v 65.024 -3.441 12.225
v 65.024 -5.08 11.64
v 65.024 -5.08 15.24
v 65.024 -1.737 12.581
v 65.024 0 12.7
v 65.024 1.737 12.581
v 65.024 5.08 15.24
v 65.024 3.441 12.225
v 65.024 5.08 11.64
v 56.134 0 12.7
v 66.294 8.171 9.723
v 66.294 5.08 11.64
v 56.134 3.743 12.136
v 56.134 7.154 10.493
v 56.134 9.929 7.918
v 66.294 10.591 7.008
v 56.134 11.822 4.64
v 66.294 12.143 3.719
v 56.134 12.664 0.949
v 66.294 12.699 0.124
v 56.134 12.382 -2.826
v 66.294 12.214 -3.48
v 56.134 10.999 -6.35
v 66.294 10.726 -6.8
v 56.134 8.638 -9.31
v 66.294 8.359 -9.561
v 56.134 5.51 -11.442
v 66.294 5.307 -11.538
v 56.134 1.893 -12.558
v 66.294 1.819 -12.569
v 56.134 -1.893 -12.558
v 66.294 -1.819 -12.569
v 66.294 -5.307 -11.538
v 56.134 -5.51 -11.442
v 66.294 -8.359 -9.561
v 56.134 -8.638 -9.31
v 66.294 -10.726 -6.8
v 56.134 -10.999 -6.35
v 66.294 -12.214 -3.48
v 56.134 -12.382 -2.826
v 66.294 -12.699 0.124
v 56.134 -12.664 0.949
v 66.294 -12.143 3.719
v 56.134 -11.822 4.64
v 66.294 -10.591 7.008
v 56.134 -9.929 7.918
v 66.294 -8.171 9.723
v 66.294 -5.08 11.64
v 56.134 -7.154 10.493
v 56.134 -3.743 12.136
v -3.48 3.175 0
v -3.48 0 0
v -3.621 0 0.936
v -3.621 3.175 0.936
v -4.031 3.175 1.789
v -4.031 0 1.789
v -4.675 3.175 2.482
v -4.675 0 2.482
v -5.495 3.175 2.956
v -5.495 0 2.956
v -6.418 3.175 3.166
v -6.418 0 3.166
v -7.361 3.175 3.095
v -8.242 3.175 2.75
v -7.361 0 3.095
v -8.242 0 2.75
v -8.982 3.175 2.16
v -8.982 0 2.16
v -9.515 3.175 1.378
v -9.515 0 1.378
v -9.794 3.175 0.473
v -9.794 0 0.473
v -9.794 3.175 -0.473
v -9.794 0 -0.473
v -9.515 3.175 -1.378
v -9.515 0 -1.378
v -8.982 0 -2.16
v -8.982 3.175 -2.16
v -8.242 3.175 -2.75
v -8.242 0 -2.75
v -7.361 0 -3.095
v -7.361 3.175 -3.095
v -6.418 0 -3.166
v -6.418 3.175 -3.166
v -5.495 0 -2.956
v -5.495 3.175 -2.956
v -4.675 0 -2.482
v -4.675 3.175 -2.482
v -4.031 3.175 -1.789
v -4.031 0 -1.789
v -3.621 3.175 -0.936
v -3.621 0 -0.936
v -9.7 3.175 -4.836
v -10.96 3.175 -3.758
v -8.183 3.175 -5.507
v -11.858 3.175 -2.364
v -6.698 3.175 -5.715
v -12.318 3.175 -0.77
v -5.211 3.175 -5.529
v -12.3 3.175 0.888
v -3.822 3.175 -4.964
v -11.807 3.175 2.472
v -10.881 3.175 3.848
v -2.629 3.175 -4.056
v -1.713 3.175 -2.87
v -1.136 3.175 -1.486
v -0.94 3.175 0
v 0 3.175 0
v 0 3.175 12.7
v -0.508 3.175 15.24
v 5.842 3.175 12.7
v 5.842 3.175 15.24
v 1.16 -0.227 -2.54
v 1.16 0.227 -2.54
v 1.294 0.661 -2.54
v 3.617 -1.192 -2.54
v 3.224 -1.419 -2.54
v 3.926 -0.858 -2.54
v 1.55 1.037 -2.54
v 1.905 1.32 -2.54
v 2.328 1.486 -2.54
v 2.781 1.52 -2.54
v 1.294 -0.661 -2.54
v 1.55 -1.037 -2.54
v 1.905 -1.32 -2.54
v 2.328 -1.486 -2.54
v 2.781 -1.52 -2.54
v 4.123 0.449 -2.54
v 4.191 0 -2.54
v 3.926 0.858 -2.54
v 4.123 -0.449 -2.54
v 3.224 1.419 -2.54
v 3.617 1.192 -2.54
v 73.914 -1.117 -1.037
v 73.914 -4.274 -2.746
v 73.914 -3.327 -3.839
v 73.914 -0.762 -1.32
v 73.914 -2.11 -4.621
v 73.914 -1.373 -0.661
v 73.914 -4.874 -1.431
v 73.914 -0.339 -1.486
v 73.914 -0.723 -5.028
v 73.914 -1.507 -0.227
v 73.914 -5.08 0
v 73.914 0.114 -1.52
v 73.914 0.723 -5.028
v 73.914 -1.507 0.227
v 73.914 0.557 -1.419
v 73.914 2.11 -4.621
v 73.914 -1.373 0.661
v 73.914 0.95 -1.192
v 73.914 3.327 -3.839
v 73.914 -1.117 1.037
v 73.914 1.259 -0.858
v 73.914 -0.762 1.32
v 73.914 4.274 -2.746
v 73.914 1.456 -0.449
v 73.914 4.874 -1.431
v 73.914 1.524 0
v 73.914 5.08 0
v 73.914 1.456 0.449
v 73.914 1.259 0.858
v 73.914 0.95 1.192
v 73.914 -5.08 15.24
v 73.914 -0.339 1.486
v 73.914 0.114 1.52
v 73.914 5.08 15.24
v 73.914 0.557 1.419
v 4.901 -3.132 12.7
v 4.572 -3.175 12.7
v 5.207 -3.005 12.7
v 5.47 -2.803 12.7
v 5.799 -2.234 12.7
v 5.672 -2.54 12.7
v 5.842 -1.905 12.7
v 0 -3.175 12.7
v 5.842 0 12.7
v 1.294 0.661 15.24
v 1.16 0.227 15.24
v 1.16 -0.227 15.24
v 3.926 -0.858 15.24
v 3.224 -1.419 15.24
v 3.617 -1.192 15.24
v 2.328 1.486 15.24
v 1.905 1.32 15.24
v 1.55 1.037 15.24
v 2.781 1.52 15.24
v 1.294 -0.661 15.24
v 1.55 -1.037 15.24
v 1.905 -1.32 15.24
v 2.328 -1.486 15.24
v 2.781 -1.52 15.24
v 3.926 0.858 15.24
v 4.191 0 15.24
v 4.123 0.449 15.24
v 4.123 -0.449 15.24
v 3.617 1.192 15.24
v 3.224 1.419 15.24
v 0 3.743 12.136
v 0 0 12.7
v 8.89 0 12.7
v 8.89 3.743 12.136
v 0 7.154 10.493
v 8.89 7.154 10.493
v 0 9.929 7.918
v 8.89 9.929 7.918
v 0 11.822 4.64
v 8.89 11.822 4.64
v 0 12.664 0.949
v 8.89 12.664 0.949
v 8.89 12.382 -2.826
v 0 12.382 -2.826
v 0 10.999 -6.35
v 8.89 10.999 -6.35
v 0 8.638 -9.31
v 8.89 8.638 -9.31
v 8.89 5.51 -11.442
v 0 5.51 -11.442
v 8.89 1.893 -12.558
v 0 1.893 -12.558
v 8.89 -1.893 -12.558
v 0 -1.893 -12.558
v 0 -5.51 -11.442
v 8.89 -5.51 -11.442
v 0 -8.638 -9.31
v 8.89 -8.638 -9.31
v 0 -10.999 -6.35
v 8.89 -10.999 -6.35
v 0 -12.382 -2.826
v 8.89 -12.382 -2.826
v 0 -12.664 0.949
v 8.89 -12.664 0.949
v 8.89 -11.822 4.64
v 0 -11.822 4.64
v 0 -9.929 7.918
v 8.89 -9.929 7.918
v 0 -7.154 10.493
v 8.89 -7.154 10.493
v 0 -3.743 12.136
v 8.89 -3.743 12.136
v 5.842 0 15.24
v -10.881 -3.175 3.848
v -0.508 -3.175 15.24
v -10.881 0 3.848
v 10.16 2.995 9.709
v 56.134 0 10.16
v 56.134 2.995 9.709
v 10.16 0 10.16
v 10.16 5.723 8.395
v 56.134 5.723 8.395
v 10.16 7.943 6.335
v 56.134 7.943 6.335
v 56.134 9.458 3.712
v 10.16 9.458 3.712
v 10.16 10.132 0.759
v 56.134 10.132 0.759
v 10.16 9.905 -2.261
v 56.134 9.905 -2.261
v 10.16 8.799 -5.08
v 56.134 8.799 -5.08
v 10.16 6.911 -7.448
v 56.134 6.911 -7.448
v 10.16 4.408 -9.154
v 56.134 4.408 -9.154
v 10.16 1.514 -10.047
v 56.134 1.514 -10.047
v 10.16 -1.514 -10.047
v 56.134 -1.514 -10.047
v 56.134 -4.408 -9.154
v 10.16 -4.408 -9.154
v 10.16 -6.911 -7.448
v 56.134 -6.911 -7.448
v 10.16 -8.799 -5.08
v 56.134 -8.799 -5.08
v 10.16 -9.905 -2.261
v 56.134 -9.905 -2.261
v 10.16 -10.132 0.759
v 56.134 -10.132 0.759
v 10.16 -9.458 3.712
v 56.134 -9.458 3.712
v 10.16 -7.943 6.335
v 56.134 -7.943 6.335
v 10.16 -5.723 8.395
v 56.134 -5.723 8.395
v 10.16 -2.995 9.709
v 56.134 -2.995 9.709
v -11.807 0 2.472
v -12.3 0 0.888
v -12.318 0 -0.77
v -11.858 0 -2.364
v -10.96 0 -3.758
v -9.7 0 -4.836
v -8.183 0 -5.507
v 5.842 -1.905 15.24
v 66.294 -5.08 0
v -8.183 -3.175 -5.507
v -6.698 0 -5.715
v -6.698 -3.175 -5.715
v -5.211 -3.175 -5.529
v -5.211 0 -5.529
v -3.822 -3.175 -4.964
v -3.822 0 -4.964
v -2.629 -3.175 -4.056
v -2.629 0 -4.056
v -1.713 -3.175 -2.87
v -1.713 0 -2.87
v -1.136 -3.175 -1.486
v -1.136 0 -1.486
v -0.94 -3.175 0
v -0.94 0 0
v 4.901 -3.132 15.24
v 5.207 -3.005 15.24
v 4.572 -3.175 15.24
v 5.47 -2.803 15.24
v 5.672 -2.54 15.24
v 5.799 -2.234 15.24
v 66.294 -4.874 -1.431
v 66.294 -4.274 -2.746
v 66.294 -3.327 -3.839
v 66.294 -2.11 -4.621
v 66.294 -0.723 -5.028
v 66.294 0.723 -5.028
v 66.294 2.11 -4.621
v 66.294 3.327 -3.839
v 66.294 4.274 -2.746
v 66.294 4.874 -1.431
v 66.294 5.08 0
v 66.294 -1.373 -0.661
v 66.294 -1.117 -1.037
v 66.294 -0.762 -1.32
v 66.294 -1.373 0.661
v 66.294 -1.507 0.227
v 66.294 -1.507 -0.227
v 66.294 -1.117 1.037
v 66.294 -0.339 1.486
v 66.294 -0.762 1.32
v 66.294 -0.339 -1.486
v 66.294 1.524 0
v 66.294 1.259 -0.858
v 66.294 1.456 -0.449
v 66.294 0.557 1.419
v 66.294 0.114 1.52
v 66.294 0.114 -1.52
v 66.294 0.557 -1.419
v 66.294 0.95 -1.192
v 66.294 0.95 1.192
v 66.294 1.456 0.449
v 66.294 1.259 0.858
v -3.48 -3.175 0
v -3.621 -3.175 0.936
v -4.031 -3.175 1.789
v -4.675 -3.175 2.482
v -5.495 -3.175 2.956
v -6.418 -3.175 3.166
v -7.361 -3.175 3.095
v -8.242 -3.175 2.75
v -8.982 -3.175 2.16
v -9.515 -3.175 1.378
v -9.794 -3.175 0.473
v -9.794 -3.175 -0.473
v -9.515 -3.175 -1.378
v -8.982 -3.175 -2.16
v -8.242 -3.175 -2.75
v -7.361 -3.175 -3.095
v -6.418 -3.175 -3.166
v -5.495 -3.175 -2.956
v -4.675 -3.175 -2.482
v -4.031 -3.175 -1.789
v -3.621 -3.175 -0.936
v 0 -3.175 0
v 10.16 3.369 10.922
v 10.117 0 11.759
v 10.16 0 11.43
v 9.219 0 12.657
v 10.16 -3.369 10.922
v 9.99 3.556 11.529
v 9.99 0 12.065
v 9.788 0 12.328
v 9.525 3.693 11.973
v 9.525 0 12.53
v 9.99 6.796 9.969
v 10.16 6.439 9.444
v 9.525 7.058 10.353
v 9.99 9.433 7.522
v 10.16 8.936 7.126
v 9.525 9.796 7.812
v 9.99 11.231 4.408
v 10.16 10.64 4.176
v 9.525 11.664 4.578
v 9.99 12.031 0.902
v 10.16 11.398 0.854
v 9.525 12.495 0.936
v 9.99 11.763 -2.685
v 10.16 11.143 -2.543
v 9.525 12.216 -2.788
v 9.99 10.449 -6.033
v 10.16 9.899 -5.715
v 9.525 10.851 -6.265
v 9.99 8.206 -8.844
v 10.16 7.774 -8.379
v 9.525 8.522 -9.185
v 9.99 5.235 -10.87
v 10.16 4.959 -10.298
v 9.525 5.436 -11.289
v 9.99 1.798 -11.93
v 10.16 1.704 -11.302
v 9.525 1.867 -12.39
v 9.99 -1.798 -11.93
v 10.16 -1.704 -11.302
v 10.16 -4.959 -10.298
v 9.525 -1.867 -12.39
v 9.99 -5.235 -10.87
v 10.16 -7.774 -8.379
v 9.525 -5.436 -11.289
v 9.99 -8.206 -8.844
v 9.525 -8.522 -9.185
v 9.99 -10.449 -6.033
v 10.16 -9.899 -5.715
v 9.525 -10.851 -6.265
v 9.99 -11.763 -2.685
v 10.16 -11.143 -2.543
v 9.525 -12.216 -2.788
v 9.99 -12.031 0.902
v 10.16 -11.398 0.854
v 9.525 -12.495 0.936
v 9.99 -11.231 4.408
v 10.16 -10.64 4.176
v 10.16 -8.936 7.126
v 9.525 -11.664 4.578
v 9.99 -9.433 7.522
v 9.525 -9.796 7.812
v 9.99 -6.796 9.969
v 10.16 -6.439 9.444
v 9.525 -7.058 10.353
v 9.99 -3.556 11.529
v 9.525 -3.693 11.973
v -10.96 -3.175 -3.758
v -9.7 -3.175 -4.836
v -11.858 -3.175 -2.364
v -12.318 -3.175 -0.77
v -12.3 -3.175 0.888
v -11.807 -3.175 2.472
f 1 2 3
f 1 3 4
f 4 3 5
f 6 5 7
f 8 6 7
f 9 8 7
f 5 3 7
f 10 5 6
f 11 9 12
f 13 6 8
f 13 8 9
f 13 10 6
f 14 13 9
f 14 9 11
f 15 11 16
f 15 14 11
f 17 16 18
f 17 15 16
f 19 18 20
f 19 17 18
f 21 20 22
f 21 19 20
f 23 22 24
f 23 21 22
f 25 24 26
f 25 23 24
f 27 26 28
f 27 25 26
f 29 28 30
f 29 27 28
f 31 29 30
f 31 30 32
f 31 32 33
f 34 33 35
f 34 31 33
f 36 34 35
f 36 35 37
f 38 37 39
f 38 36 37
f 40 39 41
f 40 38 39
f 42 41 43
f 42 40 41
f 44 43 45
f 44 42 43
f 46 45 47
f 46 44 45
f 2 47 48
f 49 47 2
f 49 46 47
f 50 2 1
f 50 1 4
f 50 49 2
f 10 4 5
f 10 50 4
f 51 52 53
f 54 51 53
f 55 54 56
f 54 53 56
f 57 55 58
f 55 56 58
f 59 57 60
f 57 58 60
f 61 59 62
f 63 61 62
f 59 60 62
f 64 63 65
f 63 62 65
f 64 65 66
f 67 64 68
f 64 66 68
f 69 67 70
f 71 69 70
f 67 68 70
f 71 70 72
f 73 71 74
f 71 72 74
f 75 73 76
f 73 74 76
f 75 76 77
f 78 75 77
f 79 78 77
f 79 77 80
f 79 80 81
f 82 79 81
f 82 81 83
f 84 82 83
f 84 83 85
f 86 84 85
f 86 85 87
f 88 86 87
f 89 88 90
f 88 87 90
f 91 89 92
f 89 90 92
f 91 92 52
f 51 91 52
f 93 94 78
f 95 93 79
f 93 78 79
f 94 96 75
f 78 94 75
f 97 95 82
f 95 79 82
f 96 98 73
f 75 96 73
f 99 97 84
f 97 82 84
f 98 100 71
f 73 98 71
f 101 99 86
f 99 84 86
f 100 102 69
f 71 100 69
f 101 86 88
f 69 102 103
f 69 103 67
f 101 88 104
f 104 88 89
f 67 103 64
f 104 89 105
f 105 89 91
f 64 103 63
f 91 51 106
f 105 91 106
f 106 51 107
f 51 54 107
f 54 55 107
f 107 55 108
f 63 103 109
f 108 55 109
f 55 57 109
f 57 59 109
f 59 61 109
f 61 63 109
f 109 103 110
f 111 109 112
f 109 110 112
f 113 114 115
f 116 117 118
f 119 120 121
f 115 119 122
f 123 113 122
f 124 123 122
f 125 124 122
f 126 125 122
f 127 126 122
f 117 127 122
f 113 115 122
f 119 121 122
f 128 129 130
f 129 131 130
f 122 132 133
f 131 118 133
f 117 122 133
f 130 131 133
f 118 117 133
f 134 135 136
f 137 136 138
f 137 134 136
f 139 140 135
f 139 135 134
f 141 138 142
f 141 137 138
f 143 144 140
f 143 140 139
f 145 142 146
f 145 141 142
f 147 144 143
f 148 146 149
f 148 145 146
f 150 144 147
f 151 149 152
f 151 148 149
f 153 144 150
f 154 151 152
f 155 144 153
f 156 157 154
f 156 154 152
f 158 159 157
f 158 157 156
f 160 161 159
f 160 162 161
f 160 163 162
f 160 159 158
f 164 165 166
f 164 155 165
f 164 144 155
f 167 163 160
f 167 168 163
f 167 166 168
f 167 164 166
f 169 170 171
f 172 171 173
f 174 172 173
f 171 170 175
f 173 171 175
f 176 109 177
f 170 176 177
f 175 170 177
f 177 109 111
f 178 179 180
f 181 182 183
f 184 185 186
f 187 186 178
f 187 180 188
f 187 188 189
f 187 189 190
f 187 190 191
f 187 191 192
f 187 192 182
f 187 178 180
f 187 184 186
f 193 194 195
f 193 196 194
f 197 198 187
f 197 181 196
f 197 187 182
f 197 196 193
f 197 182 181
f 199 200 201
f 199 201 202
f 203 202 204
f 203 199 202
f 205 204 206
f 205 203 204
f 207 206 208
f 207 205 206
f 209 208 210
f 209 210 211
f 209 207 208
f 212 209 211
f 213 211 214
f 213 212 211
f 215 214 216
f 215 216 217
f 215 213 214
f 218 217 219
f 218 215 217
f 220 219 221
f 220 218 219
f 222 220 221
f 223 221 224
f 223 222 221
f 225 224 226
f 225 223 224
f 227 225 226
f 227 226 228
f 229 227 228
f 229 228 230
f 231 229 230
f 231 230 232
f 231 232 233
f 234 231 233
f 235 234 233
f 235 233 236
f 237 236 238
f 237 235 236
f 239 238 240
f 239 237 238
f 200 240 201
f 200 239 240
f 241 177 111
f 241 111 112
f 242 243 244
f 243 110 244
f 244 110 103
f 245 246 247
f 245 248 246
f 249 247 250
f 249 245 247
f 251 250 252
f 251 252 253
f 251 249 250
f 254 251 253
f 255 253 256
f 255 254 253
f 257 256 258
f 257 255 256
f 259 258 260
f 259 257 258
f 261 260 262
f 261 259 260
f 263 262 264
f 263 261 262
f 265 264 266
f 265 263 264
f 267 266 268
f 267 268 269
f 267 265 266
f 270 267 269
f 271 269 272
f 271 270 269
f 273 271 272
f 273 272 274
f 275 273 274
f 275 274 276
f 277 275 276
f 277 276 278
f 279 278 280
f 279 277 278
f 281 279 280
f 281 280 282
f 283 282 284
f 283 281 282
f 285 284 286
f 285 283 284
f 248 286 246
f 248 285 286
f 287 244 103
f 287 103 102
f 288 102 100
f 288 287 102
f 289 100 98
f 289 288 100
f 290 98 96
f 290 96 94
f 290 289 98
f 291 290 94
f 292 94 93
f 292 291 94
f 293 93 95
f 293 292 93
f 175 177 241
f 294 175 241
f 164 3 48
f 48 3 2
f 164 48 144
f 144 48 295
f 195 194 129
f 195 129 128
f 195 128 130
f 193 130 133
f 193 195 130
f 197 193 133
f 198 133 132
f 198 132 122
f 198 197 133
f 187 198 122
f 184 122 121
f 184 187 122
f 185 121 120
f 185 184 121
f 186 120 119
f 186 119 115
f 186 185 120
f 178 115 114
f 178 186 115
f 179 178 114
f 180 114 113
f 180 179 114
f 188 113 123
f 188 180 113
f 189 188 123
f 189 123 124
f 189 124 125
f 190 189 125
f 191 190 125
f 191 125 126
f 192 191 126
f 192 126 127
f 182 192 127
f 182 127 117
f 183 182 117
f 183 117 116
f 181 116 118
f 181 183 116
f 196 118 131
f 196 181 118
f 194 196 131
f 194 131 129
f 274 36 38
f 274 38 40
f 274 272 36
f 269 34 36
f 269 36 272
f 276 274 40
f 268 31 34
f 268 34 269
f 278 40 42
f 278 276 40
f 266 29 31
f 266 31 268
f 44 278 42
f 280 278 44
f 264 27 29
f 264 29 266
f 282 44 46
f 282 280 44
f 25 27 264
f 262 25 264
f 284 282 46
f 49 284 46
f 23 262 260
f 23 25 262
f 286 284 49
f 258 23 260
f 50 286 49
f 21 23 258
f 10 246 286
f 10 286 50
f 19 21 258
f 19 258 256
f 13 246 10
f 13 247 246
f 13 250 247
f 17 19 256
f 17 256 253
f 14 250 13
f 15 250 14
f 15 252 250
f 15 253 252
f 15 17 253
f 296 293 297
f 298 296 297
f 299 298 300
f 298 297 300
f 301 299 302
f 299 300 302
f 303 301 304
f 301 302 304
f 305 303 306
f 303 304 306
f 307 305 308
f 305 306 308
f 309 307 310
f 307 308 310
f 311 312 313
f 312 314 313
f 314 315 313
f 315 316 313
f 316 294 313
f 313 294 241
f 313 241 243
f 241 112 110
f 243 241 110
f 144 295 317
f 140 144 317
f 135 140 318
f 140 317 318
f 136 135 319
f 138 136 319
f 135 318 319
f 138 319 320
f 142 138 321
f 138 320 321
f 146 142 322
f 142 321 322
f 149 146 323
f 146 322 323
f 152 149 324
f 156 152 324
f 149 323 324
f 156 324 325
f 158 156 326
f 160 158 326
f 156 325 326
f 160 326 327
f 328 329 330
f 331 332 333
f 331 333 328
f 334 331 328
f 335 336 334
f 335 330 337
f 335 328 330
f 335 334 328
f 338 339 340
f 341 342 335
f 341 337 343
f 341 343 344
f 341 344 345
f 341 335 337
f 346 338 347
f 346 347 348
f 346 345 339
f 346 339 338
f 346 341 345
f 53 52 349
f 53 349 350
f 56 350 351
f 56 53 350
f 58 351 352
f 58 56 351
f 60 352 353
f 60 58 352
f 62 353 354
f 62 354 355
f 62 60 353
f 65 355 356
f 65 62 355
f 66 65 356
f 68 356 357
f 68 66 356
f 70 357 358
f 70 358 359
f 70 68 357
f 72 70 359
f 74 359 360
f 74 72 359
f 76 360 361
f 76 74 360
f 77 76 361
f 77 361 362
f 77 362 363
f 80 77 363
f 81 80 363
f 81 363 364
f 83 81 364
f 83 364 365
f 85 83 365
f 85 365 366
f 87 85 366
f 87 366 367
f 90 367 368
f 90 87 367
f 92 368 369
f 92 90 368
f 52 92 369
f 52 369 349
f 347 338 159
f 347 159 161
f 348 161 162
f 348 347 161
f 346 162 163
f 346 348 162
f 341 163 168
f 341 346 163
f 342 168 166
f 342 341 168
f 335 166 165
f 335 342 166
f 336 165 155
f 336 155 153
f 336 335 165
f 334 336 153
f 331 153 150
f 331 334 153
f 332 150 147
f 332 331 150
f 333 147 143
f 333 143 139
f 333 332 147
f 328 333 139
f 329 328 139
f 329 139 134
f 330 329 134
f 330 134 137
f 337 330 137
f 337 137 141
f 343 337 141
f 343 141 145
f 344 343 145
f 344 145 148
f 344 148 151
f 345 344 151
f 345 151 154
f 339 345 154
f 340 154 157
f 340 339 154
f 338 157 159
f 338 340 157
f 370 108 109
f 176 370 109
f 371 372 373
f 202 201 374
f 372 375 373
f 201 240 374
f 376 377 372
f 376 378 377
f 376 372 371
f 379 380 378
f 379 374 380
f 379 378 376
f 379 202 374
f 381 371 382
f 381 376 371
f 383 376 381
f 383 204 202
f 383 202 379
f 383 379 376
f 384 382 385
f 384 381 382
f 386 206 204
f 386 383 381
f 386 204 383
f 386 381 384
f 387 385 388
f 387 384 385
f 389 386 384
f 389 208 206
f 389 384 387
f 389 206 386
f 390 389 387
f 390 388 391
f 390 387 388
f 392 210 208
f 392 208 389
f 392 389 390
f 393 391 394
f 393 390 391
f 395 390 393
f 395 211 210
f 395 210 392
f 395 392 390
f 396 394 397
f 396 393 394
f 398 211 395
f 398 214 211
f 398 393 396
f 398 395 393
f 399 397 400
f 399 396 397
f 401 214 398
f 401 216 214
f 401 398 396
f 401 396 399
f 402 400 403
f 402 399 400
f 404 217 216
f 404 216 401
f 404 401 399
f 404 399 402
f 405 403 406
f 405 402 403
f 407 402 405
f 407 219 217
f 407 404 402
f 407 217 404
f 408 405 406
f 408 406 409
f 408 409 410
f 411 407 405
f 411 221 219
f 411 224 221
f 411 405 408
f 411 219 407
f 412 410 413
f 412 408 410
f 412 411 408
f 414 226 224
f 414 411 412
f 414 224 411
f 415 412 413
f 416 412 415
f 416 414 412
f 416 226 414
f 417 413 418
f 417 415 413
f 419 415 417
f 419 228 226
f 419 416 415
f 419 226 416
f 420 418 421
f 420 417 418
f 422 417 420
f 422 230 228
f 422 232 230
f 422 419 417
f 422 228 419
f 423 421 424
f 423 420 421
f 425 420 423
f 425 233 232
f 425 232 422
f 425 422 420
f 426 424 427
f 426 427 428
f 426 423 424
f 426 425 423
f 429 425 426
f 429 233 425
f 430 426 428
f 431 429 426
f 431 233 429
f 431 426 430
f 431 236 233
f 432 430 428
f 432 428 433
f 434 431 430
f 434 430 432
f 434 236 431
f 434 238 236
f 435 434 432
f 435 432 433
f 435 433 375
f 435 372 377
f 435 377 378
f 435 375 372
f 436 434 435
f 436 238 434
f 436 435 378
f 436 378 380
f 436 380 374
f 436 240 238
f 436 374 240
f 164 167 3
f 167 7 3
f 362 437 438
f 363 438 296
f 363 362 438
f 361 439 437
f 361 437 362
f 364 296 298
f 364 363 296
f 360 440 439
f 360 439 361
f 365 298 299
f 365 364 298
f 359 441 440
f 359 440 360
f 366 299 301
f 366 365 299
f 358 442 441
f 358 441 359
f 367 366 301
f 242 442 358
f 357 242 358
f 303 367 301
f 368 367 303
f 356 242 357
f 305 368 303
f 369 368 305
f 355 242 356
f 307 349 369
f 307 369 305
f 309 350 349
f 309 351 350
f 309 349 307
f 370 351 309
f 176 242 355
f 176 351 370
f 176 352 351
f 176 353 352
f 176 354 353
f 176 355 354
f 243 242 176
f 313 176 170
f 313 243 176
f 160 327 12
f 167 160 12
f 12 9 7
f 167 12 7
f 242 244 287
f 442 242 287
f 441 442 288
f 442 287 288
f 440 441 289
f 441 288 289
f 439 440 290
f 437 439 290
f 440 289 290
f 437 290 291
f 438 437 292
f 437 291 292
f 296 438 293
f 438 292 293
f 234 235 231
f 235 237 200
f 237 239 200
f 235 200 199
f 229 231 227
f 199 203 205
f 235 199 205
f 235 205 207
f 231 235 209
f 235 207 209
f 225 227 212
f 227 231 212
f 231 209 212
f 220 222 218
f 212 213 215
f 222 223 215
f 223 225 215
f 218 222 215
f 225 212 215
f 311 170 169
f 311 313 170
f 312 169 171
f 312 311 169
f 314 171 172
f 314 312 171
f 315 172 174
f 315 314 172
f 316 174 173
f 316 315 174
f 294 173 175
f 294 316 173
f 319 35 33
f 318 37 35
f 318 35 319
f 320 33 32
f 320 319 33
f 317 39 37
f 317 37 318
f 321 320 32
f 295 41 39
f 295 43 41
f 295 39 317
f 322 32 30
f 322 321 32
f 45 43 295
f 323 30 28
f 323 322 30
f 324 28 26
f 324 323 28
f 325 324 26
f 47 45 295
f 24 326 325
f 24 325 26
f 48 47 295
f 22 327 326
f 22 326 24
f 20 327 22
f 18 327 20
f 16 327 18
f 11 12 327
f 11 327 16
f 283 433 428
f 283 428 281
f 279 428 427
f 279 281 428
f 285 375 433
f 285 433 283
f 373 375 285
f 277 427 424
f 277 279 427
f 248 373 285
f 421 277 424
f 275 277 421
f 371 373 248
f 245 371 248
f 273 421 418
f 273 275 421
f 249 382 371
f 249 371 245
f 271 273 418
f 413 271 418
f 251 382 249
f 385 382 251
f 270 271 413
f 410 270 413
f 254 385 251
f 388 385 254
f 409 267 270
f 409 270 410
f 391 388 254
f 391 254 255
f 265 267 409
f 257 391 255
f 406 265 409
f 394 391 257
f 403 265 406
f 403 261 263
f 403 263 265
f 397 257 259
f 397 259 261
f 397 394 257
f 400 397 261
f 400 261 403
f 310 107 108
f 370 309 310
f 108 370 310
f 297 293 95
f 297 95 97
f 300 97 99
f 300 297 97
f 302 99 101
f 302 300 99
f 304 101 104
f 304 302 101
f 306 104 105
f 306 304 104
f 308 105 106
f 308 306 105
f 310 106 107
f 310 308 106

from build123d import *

# Parameters (mm, degrees)
F0_W     = 5.842
F0_H     = 12.7
F0_R     = 3.175
F2_DEPTH = 3.175
F4_DEPTH = 1.27
F3_R     = 1.524
F5_DEPTH = 7.62
F6_R     = 1.524
F8_DEPTH = 17.78
F10_R    = 1.27
F11_R    = 1.27


# Not quite as in the source:
# - the program builds the solid bodies; features that only make, move or delete a surface that nothing else refers to are left out


with BuildPart() as f1:
    # F0 (on Front) → F1 (revolve)
    with BuildSketch(Plane.XZ):
        with Locations((2.921, 6.35)):
            Rectangle(F0_W, F0_H)
        Polygon((5.842, 12.7), (5.842, 0), (66.294, 0), (66.294, 12.7), (56.134, 12.7), (56.134, 10.16), (10.16, 10.16), (10.16, 12.7), align=None)
    revolve(axis=Axis((33.147, 0, 0), (-1, 0, 0)))

    # F3 (on face) → F4 (join)
    with BuildSketch(Plane.YZ.offset(66.294)):
        with BuildLine():
            ThreePointArc((-5.08, 11.6397422652), (0, 12.7), (5.08, 11.6397422652))
            Line((5.08, 11.6397422652), (5.08, 15.24))
            Line((5.08, 15.24), (-5.08, 15.24))
            Line((-5.08, 15.24), (-5.08, 11.6397422652))
        make_face()
    extrude(amount=-F4_DEPTH)

    # F3 (on face) → F5 (join)
    with BuildSketch(Plane.YZ.offset(66.294)):
        with BuildLine():
            ThreePointArc((-5.08, 0), (0, -5.08), (5.08, 0))
            ThreePointArc((5.08, 0), (0, 5.08), (-5.08, 0))
        make_face()
        Circle(F3_R, mode=Mode.SUBTRACT)
        with BuildLine():
            ThreePointArc((-5.08, 0), (0, 5.08), (5.08, 0))
            Line((5.08, 0), (5.08, 15.24))
            Line((5.08, 15.24), (-5.08, 15.24))
            Line((-5.08, 15.24), (-5.08, 0))
        make_face()
    extrude(amount=F5_DEPTH)

    # F10
    f10_edges = [f1.edges().sort_by_distance(p)[0] for p in [
        (10.16, 0, -12.7),
    ]]
    fillet(f10_edges, radius=F10_R)


with BuildPart() as f2:
    # F0 (on Front) → F2 (new body, symmetric)
    with BuildSketch(Plane.XZ):
        with BuildLine():
            Line((-0.9398, 0), (0, 0))
            Line((0, 0), (0, 12.7))
            Line((0, 12.7), (5.842, 12.7))
            Line((5.842, 12.7), (5.842, 15.24))
            Line((5.842, 15.24), (-0.508, 15.24))
            Line((-0.508, 15.24), (-10.8806298187, 3.8475430269))
            ThreePointArc((-10.8806298187, 3.8475430269), (-4.5919612295, 5.3297205562), (-0.9398, 0))
        make_face()
        with BuildLine():
            ThreePointArc((-8.1826630726, -5.5069827884), (-3.1957909266, -4.5493385486), (-0.9398, 0))
            ThreePointArc((-0.9398, 0), (-4.5919612295, 5.3297205562), (-10.8806298187, 3.8475430269))
            ThreePointArc((-10.8806298187, 3.8475430269), (-12.1459778134, -1.5837270034), (-8.1826630726, -5.5069827884))
        make_face()
        with Locations((-6.6548, 0)):
            Circle(F0_R, mode=Mode.SUBTRACT)
    extrude(amount=F2_DEPTH, both=True)

    # F11
    f11_edges = [f2.edges().sort_by_distance(p)[0] for p in [
        (5.842, -3.175, 13.97),
    ]]
    fillet(f11_edges, radius=F11_R)


with BuildPart() as f8:
    # F6 (on face) → F8 (new body)
    with BuildSketch(Plane.XY.offset(15.24)):
        with Locations((2.667, 0)):
            Circle(F6_R)
    extrude(amount=-F8_DEPTH)


solid = Compound([f1.part, f2.part, f8.part])
